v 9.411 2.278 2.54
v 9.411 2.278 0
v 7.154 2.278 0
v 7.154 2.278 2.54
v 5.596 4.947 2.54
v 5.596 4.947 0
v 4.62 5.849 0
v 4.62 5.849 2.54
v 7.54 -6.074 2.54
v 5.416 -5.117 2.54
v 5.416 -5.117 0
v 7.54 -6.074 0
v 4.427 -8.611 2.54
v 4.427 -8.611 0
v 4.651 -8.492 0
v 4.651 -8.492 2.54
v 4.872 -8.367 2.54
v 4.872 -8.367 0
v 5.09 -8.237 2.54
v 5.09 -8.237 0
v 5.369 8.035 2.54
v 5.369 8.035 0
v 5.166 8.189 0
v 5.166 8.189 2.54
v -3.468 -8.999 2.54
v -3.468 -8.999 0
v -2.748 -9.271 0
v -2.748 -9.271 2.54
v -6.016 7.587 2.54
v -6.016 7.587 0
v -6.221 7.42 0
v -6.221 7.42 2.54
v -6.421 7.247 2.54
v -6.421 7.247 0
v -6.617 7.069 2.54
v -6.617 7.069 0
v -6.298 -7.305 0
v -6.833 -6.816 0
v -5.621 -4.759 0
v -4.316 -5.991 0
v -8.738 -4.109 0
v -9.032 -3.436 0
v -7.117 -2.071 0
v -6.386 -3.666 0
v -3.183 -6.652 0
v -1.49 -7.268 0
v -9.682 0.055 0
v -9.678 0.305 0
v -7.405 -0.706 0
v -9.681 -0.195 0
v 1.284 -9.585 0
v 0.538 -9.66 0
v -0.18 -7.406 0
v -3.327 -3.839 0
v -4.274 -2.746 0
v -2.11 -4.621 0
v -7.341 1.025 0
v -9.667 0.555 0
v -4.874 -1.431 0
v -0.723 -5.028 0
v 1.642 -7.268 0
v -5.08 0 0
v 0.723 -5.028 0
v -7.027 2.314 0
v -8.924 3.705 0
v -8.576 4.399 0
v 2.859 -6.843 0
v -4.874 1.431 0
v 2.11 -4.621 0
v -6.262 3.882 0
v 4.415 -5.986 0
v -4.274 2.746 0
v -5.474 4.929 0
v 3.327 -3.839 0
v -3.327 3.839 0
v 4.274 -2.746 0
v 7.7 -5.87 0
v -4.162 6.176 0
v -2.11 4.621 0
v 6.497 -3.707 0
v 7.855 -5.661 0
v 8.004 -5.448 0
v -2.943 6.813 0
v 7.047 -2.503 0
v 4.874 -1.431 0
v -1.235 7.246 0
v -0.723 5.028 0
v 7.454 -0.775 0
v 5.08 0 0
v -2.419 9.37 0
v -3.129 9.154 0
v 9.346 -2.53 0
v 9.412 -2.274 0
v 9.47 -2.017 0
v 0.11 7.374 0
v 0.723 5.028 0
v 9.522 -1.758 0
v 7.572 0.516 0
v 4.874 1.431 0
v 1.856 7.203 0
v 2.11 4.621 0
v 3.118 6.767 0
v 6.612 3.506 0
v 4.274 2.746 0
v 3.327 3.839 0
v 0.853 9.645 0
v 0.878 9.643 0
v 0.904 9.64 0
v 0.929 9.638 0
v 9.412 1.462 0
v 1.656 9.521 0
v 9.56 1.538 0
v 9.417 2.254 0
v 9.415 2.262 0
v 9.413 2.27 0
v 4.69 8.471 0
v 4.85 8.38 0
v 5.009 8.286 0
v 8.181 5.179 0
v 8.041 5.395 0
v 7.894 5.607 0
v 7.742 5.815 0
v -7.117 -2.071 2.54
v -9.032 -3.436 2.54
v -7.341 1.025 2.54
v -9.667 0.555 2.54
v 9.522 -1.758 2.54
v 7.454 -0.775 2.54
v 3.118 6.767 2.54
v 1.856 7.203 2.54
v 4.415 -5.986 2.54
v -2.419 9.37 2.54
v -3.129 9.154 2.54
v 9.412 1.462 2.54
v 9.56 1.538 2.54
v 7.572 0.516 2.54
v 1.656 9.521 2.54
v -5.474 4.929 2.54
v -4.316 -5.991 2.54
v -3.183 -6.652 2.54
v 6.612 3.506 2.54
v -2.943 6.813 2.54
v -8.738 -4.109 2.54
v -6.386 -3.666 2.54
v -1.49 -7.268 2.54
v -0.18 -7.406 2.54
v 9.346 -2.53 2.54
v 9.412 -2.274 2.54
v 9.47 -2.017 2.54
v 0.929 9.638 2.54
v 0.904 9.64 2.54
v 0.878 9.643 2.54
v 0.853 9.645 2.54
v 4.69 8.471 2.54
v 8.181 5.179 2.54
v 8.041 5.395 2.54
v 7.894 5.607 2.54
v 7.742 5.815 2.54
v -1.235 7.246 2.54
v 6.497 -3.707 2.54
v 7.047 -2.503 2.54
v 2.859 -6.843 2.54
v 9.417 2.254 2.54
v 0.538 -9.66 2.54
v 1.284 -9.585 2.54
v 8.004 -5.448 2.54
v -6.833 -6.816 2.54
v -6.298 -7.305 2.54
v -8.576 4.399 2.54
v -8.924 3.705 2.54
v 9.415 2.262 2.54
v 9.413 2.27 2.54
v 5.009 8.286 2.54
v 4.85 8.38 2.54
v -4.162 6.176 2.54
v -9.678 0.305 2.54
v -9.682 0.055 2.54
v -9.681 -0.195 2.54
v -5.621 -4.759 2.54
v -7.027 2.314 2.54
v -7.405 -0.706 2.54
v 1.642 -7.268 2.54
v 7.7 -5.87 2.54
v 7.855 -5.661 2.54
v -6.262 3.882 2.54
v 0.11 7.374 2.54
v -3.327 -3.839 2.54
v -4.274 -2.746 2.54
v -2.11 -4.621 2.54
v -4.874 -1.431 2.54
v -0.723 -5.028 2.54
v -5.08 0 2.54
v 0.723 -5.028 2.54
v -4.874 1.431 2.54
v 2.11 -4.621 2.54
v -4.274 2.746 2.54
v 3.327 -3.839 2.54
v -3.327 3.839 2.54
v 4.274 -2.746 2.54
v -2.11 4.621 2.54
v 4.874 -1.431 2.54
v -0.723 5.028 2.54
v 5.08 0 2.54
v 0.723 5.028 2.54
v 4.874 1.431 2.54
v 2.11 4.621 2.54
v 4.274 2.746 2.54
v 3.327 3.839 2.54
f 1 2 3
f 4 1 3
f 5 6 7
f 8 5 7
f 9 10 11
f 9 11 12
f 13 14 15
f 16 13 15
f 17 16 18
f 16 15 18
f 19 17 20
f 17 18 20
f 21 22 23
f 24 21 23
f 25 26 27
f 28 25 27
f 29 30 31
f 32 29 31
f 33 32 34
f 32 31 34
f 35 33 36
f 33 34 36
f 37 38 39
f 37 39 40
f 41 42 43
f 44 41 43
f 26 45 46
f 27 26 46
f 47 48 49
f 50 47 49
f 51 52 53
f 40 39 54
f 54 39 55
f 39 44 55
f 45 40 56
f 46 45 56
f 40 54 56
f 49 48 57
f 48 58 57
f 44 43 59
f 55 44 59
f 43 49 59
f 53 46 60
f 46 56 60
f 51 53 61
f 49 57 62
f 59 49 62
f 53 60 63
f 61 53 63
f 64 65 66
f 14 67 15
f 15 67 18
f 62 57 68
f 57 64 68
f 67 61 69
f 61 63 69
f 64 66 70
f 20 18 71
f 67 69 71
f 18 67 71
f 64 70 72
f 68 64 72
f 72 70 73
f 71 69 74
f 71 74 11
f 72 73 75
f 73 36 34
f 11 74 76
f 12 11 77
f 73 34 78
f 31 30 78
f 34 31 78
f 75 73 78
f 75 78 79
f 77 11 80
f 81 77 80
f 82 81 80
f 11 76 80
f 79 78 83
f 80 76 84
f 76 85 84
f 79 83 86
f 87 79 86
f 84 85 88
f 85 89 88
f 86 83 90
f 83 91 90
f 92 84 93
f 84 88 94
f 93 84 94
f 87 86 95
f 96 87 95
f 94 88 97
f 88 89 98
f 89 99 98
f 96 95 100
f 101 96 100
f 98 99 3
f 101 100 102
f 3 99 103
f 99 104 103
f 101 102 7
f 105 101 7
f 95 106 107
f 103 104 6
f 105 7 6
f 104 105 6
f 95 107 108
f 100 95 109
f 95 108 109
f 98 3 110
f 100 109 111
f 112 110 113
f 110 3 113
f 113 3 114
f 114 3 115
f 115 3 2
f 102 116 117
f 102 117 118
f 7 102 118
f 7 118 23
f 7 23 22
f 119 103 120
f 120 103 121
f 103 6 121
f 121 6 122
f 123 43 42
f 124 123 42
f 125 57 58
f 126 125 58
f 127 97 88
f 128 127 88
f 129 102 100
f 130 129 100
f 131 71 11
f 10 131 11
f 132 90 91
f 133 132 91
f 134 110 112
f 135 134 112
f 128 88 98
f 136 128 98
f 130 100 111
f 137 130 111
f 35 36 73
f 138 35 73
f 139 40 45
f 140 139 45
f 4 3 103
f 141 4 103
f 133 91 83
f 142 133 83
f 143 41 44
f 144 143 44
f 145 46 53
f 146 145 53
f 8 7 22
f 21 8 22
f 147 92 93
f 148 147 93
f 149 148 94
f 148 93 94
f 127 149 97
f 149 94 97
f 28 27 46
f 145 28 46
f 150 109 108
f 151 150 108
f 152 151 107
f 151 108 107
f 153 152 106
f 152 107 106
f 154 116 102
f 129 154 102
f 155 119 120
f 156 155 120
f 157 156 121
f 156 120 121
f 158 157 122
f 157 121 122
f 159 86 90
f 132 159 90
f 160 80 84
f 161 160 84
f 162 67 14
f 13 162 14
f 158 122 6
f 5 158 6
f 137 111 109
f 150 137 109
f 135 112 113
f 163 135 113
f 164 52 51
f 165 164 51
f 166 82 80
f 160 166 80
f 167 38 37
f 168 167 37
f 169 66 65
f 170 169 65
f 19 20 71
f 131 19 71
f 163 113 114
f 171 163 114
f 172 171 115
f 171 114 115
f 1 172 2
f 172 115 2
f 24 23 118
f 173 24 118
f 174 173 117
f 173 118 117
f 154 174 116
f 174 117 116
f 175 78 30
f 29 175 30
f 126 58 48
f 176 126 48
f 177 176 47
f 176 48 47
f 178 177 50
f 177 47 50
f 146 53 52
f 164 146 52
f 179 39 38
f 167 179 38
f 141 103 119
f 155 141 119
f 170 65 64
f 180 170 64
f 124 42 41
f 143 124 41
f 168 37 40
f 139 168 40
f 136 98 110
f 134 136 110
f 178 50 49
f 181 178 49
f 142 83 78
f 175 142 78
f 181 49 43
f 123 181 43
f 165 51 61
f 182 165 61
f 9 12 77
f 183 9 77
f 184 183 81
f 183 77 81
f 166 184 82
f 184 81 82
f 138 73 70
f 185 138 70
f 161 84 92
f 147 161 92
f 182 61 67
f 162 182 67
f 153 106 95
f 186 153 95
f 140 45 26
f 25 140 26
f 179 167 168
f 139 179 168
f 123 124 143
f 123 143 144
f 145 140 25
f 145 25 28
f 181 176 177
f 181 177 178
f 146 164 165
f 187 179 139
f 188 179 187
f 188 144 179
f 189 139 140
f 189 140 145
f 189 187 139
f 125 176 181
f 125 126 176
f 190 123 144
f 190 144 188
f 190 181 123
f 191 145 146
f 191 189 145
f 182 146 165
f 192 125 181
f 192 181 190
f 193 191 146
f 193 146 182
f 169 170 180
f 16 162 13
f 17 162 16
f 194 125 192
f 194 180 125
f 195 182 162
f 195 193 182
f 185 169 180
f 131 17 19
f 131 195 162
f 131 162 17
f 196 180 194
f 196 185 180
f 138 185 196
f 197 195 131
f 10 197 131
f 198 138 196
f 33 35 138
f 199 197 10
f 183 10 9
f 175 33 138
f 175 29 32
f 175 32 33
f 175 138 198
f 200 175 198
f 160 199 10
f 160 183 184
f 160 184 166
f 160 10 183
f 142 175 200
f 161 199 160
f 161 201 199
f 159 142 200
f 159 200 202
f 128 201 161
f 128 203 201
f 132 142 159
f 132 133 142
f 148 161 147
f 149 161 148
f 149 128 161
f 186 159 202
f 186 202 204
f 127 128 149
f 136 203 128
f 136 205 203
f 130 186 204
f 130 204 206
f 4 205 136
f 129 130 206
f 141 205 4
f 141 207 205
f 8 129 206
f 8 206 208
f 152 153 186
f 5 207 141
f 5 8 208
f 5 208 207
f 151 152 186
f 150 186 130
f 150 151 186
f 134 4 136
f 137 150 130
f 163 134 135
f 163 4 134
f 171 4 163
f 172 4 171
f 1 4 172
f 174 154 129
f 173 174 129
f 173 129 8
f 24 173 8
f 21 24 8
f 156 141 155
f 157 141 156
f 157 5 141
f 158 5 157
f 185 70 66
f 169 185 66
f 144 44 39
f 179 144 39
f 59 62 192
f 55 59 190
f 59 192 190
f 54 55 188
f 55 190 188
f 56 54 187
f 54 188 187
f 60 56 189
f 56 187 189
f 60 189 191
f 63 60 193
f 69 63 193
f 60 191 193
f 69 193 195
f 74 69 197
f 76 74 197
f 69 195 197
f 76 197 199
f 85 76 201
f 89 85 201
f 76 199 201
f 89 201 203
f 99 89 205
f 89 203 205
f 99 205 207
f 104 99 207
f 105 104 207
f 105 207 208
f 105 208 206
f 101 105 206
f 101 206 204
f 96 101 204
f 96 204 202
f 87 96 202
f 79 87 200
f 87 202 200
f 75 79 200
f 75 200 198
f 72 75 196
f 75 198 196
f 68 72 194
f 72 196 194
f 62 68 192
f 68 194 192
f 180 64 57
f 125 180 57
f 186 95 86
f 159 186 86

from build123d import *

# Parameters (mm, degrees)
F1_DEPTH = 2.54
F4_D     = 10.16
F4_DEPTH = 2.54
F4_TIP   = 3.0523719447


with BuildPart() as f1:
    # F0 (on Top) → F1 (new body)
    with BuildSketch(Plane.XY):
        with BuildLine():
            Line((-6.8331683087, -6.8155120711), (-6.2978819926, -7.3050655915))
            Line((-6.2978819926, -7.3050655915), (-4.316461231, -5.9911443529))
            Line((-4.316461231, -5.9911443529), (-3.1834454186, -6.6520702435))
            Line((-3.1834454186, -6.6520702435), (-3.4675601543, -8.9987342074))
            Line((-3.4675601543, -8.9987342074), (-2.7476248397, -9.2706777631))
            Line((-2.7476248397, -9.2706777631), (-1.4900637669, -7.2682696548))
            Line((-1.4900637669, -7.2682696548), (-0.1799902587, -7.4061532934))
            Line((-0.1799902587, -7.4061532934), (0.53803154, -9.6603514426))
            Line((0.53803154, -9.6603514426), (1.2835661727, -9.5852906378))
            Line((1.2835661727, -9.5852906378), (1.6418913593, -7.2682696548))
            Line((1.6418913593, -7.2682696548), (2.8590536505, -6.8429019717))
            Line((2.8590536505, -6.8429019717), (4.4267883674, -8.6114303767))
            ThreePointArc((4.4267883674, -8.6114303767), (4.7621164114, -8.430624868), (5.0900724152, -8.2367682491))
            Line((5.0900724152, -8.2367682491), (4.414810271, -5.9861610474))
            Line((4.414810271, -5.9861610474), (5.416404056, -5.1173232333))
            Line((5.416404056, -5.1173232333), (7.5402496681, -6.0743578528))
            ThreePointArc((7.5402496681, -6.0743578528), (7.7785505678, -5.7660505935), (8.0042534911, -5.4484047603))
            Line((8.0042534911, -5.4484047603), (6.4974054455, -3.7073606396))
            Line((6.4974054455, -3.7073606396), (7.0467623816, -2.5027365269))
            Line((7.0467623816, -2.5027365269), (9.3462724586, -2.5298971346))
            ThreePointArc((9.3462724586, -2.5298971346), (9.4419154496, -2.145558441), (9.5217606328, -1.757629891))
            Line((9.5217606328, -1.757629891), (7.4543519629, -0.7753081489))
            Line((7.4543519629, -0.7753081489), (7.5720577138, 0.515978468))
            Line((7.5720577138, 0.515978468), (9.4118826679, 1.4620667743))
            Line((9.4118826679, 1.4620667743), (9.5596825543, 1.5380695179))
            Line((9.5596825543, 1.5380695179), (9.416678635, 2.2537417481))
            ThreePointArc((9.416678635, 2.2537417481), (9.4137978769, 2.2657444506), (9.4109018198, 2.2777434708))
            Line((9.4109018198, 2.2777434708), (7.1536707948, 2.2777434708))
            Line((7.1536707948, 2.2777434708), (6.6120580312, 3.506264905))
            Line((6.6120580312, 3.506264905), (8.1813489345, 5.1786791747))
            ThreePointArc((8.1813489345, 5.1786791747), (7.9680827327, 5.5011676894), (7.7421121151, 5.8148850701))
            Line((7.7421121151, 5.8148850701), (5.5964540897, 4.9471179465))
            Line((5.5964540897, 4.9471179465), (4.619770739, 5.8493615309))
            Line((4.619770739, 5.8493615309), (5.3694094978, 8.0347383187))
            Line((5.3694094978, 8.0347383187), (5.1664119437, 8.1891010502))
            ThreePointArc((5.1664119437, 8.1891010502), (4.9301428504, 8.3334794568), (4.6898420519, 8.4710430237))
            Line((4.6898420519, 8.4710430237), (3.1182668573, 6.7673715214))
            Line((3.1182668573, 6.7673715214), (1.8562393493, 7.2027559673))
            Line((1.8562393493, 7.2027559673), (1.6558854627, 9.5211366727))
            Line((1.6558854627, 9.5211366727), (0.9290533371, 9.6379483438))
            ThreePointArc((0.9290533371, 9.6379483438), (0.8909600606, 9.641544407), (0.8528528712, 9.6449899099))
            Line((0.8528528712, 9.6449899099), (0.1102985869, 7.3744878367))
            Line((0.1102985869, 7.3744878367), (-1.2349347684, 7.2456887003))
            Line((-1.2349347684, 7.2456887003), (-2.4185909857, 9.3696708082))
            Line((-2.4185909857, 9.3696708082), (-3.128865287, 9.1543172047))
            Line((-3.128865287, 9.1543172047), (-2.9428471919, 6.8132407112))
            Line((-2.9428471919, 6.8132407112), (-4.1615320816, 6.1761889411))
            Line((-4.1615320816, 6.1761889411), (-6.016344287, 7.5866191285))
            ThreePointArc((-6.016344287, 7.5866191285), (-6.321753073, 7.3340729793), (-6.6165717429, 7.0692408894))
            Line((-6.6165717429, 7.0692408894), (-5.4735798935, 4.9287530222))
            Line((-5.4735798935, 4.9287530222), (-6.2615627322, 3.8819453014))
            Line((-6.2615627322, 3.8819453014), (-8.5762331436, 4.3989693402))
            Line((-8.5762331436, 4.3989693402), (-8.9240014984, 3.7051745846))
            Line((-8.9240014984, 3.7051745846), (-7.0272791194, 2.3135405903))
            Line((-7.0272791194, 2.3135405903), (-7.3407024127, 1.0249859563))
            Line((-7.3407024127, 1.0249859563), (-9.6667165043, 0.5547796031))
            ThreePointArc((-9.6667165043, 0.5547796031), (-9.6809513806, 0.1799131703), (-9.6806547422, -0.1952233199))
            Line((-9.6806547422, -0.1952233199), (-7.4054314828, -0.7064821591))
            Line((-7.4054314828, -0.7064821591), (-7.1172324763, -2.0714243811))
            Line((-7.1172324763, -2.0714243811), (-9.0316843933, -3.4364557412))
            Line((-9.0316843933, -3.4364557412), (-8.7383911794, -4.1093048652))
            Line((-8.7383911794, -4.1093048652), (-6.3862953563, -3.6664897539))
            Line((-6.3862953563, -3.6664897539), (-5.6214329554, -4.7591500254))
            Line((-5.6214329554, -4.7591500254), (-6.8331683087, -6.8155120711))
        make_face()
    extrude(amount=F1_DEPTH)


with BuildPart() as f1_1:
    # F3: moved
    add(f1.part)

    # F4
    with Locations(Plane(origin=(0, 0, 0), x_dir=(1, 0, 0), z_dir=(0, 0, -1))):
        with Locations((0, 0)):
            Hole(F4_D / 2, depth=F4_DEPTH)
            with Locations((0, 0, -(F4_DEPTH + F4_TIP / 2))):  # 118° drill point
                Cone(0, F4_D / 2, F4_TIP, mode=Mode.SUBTRACT)


solid = f1_1.part
